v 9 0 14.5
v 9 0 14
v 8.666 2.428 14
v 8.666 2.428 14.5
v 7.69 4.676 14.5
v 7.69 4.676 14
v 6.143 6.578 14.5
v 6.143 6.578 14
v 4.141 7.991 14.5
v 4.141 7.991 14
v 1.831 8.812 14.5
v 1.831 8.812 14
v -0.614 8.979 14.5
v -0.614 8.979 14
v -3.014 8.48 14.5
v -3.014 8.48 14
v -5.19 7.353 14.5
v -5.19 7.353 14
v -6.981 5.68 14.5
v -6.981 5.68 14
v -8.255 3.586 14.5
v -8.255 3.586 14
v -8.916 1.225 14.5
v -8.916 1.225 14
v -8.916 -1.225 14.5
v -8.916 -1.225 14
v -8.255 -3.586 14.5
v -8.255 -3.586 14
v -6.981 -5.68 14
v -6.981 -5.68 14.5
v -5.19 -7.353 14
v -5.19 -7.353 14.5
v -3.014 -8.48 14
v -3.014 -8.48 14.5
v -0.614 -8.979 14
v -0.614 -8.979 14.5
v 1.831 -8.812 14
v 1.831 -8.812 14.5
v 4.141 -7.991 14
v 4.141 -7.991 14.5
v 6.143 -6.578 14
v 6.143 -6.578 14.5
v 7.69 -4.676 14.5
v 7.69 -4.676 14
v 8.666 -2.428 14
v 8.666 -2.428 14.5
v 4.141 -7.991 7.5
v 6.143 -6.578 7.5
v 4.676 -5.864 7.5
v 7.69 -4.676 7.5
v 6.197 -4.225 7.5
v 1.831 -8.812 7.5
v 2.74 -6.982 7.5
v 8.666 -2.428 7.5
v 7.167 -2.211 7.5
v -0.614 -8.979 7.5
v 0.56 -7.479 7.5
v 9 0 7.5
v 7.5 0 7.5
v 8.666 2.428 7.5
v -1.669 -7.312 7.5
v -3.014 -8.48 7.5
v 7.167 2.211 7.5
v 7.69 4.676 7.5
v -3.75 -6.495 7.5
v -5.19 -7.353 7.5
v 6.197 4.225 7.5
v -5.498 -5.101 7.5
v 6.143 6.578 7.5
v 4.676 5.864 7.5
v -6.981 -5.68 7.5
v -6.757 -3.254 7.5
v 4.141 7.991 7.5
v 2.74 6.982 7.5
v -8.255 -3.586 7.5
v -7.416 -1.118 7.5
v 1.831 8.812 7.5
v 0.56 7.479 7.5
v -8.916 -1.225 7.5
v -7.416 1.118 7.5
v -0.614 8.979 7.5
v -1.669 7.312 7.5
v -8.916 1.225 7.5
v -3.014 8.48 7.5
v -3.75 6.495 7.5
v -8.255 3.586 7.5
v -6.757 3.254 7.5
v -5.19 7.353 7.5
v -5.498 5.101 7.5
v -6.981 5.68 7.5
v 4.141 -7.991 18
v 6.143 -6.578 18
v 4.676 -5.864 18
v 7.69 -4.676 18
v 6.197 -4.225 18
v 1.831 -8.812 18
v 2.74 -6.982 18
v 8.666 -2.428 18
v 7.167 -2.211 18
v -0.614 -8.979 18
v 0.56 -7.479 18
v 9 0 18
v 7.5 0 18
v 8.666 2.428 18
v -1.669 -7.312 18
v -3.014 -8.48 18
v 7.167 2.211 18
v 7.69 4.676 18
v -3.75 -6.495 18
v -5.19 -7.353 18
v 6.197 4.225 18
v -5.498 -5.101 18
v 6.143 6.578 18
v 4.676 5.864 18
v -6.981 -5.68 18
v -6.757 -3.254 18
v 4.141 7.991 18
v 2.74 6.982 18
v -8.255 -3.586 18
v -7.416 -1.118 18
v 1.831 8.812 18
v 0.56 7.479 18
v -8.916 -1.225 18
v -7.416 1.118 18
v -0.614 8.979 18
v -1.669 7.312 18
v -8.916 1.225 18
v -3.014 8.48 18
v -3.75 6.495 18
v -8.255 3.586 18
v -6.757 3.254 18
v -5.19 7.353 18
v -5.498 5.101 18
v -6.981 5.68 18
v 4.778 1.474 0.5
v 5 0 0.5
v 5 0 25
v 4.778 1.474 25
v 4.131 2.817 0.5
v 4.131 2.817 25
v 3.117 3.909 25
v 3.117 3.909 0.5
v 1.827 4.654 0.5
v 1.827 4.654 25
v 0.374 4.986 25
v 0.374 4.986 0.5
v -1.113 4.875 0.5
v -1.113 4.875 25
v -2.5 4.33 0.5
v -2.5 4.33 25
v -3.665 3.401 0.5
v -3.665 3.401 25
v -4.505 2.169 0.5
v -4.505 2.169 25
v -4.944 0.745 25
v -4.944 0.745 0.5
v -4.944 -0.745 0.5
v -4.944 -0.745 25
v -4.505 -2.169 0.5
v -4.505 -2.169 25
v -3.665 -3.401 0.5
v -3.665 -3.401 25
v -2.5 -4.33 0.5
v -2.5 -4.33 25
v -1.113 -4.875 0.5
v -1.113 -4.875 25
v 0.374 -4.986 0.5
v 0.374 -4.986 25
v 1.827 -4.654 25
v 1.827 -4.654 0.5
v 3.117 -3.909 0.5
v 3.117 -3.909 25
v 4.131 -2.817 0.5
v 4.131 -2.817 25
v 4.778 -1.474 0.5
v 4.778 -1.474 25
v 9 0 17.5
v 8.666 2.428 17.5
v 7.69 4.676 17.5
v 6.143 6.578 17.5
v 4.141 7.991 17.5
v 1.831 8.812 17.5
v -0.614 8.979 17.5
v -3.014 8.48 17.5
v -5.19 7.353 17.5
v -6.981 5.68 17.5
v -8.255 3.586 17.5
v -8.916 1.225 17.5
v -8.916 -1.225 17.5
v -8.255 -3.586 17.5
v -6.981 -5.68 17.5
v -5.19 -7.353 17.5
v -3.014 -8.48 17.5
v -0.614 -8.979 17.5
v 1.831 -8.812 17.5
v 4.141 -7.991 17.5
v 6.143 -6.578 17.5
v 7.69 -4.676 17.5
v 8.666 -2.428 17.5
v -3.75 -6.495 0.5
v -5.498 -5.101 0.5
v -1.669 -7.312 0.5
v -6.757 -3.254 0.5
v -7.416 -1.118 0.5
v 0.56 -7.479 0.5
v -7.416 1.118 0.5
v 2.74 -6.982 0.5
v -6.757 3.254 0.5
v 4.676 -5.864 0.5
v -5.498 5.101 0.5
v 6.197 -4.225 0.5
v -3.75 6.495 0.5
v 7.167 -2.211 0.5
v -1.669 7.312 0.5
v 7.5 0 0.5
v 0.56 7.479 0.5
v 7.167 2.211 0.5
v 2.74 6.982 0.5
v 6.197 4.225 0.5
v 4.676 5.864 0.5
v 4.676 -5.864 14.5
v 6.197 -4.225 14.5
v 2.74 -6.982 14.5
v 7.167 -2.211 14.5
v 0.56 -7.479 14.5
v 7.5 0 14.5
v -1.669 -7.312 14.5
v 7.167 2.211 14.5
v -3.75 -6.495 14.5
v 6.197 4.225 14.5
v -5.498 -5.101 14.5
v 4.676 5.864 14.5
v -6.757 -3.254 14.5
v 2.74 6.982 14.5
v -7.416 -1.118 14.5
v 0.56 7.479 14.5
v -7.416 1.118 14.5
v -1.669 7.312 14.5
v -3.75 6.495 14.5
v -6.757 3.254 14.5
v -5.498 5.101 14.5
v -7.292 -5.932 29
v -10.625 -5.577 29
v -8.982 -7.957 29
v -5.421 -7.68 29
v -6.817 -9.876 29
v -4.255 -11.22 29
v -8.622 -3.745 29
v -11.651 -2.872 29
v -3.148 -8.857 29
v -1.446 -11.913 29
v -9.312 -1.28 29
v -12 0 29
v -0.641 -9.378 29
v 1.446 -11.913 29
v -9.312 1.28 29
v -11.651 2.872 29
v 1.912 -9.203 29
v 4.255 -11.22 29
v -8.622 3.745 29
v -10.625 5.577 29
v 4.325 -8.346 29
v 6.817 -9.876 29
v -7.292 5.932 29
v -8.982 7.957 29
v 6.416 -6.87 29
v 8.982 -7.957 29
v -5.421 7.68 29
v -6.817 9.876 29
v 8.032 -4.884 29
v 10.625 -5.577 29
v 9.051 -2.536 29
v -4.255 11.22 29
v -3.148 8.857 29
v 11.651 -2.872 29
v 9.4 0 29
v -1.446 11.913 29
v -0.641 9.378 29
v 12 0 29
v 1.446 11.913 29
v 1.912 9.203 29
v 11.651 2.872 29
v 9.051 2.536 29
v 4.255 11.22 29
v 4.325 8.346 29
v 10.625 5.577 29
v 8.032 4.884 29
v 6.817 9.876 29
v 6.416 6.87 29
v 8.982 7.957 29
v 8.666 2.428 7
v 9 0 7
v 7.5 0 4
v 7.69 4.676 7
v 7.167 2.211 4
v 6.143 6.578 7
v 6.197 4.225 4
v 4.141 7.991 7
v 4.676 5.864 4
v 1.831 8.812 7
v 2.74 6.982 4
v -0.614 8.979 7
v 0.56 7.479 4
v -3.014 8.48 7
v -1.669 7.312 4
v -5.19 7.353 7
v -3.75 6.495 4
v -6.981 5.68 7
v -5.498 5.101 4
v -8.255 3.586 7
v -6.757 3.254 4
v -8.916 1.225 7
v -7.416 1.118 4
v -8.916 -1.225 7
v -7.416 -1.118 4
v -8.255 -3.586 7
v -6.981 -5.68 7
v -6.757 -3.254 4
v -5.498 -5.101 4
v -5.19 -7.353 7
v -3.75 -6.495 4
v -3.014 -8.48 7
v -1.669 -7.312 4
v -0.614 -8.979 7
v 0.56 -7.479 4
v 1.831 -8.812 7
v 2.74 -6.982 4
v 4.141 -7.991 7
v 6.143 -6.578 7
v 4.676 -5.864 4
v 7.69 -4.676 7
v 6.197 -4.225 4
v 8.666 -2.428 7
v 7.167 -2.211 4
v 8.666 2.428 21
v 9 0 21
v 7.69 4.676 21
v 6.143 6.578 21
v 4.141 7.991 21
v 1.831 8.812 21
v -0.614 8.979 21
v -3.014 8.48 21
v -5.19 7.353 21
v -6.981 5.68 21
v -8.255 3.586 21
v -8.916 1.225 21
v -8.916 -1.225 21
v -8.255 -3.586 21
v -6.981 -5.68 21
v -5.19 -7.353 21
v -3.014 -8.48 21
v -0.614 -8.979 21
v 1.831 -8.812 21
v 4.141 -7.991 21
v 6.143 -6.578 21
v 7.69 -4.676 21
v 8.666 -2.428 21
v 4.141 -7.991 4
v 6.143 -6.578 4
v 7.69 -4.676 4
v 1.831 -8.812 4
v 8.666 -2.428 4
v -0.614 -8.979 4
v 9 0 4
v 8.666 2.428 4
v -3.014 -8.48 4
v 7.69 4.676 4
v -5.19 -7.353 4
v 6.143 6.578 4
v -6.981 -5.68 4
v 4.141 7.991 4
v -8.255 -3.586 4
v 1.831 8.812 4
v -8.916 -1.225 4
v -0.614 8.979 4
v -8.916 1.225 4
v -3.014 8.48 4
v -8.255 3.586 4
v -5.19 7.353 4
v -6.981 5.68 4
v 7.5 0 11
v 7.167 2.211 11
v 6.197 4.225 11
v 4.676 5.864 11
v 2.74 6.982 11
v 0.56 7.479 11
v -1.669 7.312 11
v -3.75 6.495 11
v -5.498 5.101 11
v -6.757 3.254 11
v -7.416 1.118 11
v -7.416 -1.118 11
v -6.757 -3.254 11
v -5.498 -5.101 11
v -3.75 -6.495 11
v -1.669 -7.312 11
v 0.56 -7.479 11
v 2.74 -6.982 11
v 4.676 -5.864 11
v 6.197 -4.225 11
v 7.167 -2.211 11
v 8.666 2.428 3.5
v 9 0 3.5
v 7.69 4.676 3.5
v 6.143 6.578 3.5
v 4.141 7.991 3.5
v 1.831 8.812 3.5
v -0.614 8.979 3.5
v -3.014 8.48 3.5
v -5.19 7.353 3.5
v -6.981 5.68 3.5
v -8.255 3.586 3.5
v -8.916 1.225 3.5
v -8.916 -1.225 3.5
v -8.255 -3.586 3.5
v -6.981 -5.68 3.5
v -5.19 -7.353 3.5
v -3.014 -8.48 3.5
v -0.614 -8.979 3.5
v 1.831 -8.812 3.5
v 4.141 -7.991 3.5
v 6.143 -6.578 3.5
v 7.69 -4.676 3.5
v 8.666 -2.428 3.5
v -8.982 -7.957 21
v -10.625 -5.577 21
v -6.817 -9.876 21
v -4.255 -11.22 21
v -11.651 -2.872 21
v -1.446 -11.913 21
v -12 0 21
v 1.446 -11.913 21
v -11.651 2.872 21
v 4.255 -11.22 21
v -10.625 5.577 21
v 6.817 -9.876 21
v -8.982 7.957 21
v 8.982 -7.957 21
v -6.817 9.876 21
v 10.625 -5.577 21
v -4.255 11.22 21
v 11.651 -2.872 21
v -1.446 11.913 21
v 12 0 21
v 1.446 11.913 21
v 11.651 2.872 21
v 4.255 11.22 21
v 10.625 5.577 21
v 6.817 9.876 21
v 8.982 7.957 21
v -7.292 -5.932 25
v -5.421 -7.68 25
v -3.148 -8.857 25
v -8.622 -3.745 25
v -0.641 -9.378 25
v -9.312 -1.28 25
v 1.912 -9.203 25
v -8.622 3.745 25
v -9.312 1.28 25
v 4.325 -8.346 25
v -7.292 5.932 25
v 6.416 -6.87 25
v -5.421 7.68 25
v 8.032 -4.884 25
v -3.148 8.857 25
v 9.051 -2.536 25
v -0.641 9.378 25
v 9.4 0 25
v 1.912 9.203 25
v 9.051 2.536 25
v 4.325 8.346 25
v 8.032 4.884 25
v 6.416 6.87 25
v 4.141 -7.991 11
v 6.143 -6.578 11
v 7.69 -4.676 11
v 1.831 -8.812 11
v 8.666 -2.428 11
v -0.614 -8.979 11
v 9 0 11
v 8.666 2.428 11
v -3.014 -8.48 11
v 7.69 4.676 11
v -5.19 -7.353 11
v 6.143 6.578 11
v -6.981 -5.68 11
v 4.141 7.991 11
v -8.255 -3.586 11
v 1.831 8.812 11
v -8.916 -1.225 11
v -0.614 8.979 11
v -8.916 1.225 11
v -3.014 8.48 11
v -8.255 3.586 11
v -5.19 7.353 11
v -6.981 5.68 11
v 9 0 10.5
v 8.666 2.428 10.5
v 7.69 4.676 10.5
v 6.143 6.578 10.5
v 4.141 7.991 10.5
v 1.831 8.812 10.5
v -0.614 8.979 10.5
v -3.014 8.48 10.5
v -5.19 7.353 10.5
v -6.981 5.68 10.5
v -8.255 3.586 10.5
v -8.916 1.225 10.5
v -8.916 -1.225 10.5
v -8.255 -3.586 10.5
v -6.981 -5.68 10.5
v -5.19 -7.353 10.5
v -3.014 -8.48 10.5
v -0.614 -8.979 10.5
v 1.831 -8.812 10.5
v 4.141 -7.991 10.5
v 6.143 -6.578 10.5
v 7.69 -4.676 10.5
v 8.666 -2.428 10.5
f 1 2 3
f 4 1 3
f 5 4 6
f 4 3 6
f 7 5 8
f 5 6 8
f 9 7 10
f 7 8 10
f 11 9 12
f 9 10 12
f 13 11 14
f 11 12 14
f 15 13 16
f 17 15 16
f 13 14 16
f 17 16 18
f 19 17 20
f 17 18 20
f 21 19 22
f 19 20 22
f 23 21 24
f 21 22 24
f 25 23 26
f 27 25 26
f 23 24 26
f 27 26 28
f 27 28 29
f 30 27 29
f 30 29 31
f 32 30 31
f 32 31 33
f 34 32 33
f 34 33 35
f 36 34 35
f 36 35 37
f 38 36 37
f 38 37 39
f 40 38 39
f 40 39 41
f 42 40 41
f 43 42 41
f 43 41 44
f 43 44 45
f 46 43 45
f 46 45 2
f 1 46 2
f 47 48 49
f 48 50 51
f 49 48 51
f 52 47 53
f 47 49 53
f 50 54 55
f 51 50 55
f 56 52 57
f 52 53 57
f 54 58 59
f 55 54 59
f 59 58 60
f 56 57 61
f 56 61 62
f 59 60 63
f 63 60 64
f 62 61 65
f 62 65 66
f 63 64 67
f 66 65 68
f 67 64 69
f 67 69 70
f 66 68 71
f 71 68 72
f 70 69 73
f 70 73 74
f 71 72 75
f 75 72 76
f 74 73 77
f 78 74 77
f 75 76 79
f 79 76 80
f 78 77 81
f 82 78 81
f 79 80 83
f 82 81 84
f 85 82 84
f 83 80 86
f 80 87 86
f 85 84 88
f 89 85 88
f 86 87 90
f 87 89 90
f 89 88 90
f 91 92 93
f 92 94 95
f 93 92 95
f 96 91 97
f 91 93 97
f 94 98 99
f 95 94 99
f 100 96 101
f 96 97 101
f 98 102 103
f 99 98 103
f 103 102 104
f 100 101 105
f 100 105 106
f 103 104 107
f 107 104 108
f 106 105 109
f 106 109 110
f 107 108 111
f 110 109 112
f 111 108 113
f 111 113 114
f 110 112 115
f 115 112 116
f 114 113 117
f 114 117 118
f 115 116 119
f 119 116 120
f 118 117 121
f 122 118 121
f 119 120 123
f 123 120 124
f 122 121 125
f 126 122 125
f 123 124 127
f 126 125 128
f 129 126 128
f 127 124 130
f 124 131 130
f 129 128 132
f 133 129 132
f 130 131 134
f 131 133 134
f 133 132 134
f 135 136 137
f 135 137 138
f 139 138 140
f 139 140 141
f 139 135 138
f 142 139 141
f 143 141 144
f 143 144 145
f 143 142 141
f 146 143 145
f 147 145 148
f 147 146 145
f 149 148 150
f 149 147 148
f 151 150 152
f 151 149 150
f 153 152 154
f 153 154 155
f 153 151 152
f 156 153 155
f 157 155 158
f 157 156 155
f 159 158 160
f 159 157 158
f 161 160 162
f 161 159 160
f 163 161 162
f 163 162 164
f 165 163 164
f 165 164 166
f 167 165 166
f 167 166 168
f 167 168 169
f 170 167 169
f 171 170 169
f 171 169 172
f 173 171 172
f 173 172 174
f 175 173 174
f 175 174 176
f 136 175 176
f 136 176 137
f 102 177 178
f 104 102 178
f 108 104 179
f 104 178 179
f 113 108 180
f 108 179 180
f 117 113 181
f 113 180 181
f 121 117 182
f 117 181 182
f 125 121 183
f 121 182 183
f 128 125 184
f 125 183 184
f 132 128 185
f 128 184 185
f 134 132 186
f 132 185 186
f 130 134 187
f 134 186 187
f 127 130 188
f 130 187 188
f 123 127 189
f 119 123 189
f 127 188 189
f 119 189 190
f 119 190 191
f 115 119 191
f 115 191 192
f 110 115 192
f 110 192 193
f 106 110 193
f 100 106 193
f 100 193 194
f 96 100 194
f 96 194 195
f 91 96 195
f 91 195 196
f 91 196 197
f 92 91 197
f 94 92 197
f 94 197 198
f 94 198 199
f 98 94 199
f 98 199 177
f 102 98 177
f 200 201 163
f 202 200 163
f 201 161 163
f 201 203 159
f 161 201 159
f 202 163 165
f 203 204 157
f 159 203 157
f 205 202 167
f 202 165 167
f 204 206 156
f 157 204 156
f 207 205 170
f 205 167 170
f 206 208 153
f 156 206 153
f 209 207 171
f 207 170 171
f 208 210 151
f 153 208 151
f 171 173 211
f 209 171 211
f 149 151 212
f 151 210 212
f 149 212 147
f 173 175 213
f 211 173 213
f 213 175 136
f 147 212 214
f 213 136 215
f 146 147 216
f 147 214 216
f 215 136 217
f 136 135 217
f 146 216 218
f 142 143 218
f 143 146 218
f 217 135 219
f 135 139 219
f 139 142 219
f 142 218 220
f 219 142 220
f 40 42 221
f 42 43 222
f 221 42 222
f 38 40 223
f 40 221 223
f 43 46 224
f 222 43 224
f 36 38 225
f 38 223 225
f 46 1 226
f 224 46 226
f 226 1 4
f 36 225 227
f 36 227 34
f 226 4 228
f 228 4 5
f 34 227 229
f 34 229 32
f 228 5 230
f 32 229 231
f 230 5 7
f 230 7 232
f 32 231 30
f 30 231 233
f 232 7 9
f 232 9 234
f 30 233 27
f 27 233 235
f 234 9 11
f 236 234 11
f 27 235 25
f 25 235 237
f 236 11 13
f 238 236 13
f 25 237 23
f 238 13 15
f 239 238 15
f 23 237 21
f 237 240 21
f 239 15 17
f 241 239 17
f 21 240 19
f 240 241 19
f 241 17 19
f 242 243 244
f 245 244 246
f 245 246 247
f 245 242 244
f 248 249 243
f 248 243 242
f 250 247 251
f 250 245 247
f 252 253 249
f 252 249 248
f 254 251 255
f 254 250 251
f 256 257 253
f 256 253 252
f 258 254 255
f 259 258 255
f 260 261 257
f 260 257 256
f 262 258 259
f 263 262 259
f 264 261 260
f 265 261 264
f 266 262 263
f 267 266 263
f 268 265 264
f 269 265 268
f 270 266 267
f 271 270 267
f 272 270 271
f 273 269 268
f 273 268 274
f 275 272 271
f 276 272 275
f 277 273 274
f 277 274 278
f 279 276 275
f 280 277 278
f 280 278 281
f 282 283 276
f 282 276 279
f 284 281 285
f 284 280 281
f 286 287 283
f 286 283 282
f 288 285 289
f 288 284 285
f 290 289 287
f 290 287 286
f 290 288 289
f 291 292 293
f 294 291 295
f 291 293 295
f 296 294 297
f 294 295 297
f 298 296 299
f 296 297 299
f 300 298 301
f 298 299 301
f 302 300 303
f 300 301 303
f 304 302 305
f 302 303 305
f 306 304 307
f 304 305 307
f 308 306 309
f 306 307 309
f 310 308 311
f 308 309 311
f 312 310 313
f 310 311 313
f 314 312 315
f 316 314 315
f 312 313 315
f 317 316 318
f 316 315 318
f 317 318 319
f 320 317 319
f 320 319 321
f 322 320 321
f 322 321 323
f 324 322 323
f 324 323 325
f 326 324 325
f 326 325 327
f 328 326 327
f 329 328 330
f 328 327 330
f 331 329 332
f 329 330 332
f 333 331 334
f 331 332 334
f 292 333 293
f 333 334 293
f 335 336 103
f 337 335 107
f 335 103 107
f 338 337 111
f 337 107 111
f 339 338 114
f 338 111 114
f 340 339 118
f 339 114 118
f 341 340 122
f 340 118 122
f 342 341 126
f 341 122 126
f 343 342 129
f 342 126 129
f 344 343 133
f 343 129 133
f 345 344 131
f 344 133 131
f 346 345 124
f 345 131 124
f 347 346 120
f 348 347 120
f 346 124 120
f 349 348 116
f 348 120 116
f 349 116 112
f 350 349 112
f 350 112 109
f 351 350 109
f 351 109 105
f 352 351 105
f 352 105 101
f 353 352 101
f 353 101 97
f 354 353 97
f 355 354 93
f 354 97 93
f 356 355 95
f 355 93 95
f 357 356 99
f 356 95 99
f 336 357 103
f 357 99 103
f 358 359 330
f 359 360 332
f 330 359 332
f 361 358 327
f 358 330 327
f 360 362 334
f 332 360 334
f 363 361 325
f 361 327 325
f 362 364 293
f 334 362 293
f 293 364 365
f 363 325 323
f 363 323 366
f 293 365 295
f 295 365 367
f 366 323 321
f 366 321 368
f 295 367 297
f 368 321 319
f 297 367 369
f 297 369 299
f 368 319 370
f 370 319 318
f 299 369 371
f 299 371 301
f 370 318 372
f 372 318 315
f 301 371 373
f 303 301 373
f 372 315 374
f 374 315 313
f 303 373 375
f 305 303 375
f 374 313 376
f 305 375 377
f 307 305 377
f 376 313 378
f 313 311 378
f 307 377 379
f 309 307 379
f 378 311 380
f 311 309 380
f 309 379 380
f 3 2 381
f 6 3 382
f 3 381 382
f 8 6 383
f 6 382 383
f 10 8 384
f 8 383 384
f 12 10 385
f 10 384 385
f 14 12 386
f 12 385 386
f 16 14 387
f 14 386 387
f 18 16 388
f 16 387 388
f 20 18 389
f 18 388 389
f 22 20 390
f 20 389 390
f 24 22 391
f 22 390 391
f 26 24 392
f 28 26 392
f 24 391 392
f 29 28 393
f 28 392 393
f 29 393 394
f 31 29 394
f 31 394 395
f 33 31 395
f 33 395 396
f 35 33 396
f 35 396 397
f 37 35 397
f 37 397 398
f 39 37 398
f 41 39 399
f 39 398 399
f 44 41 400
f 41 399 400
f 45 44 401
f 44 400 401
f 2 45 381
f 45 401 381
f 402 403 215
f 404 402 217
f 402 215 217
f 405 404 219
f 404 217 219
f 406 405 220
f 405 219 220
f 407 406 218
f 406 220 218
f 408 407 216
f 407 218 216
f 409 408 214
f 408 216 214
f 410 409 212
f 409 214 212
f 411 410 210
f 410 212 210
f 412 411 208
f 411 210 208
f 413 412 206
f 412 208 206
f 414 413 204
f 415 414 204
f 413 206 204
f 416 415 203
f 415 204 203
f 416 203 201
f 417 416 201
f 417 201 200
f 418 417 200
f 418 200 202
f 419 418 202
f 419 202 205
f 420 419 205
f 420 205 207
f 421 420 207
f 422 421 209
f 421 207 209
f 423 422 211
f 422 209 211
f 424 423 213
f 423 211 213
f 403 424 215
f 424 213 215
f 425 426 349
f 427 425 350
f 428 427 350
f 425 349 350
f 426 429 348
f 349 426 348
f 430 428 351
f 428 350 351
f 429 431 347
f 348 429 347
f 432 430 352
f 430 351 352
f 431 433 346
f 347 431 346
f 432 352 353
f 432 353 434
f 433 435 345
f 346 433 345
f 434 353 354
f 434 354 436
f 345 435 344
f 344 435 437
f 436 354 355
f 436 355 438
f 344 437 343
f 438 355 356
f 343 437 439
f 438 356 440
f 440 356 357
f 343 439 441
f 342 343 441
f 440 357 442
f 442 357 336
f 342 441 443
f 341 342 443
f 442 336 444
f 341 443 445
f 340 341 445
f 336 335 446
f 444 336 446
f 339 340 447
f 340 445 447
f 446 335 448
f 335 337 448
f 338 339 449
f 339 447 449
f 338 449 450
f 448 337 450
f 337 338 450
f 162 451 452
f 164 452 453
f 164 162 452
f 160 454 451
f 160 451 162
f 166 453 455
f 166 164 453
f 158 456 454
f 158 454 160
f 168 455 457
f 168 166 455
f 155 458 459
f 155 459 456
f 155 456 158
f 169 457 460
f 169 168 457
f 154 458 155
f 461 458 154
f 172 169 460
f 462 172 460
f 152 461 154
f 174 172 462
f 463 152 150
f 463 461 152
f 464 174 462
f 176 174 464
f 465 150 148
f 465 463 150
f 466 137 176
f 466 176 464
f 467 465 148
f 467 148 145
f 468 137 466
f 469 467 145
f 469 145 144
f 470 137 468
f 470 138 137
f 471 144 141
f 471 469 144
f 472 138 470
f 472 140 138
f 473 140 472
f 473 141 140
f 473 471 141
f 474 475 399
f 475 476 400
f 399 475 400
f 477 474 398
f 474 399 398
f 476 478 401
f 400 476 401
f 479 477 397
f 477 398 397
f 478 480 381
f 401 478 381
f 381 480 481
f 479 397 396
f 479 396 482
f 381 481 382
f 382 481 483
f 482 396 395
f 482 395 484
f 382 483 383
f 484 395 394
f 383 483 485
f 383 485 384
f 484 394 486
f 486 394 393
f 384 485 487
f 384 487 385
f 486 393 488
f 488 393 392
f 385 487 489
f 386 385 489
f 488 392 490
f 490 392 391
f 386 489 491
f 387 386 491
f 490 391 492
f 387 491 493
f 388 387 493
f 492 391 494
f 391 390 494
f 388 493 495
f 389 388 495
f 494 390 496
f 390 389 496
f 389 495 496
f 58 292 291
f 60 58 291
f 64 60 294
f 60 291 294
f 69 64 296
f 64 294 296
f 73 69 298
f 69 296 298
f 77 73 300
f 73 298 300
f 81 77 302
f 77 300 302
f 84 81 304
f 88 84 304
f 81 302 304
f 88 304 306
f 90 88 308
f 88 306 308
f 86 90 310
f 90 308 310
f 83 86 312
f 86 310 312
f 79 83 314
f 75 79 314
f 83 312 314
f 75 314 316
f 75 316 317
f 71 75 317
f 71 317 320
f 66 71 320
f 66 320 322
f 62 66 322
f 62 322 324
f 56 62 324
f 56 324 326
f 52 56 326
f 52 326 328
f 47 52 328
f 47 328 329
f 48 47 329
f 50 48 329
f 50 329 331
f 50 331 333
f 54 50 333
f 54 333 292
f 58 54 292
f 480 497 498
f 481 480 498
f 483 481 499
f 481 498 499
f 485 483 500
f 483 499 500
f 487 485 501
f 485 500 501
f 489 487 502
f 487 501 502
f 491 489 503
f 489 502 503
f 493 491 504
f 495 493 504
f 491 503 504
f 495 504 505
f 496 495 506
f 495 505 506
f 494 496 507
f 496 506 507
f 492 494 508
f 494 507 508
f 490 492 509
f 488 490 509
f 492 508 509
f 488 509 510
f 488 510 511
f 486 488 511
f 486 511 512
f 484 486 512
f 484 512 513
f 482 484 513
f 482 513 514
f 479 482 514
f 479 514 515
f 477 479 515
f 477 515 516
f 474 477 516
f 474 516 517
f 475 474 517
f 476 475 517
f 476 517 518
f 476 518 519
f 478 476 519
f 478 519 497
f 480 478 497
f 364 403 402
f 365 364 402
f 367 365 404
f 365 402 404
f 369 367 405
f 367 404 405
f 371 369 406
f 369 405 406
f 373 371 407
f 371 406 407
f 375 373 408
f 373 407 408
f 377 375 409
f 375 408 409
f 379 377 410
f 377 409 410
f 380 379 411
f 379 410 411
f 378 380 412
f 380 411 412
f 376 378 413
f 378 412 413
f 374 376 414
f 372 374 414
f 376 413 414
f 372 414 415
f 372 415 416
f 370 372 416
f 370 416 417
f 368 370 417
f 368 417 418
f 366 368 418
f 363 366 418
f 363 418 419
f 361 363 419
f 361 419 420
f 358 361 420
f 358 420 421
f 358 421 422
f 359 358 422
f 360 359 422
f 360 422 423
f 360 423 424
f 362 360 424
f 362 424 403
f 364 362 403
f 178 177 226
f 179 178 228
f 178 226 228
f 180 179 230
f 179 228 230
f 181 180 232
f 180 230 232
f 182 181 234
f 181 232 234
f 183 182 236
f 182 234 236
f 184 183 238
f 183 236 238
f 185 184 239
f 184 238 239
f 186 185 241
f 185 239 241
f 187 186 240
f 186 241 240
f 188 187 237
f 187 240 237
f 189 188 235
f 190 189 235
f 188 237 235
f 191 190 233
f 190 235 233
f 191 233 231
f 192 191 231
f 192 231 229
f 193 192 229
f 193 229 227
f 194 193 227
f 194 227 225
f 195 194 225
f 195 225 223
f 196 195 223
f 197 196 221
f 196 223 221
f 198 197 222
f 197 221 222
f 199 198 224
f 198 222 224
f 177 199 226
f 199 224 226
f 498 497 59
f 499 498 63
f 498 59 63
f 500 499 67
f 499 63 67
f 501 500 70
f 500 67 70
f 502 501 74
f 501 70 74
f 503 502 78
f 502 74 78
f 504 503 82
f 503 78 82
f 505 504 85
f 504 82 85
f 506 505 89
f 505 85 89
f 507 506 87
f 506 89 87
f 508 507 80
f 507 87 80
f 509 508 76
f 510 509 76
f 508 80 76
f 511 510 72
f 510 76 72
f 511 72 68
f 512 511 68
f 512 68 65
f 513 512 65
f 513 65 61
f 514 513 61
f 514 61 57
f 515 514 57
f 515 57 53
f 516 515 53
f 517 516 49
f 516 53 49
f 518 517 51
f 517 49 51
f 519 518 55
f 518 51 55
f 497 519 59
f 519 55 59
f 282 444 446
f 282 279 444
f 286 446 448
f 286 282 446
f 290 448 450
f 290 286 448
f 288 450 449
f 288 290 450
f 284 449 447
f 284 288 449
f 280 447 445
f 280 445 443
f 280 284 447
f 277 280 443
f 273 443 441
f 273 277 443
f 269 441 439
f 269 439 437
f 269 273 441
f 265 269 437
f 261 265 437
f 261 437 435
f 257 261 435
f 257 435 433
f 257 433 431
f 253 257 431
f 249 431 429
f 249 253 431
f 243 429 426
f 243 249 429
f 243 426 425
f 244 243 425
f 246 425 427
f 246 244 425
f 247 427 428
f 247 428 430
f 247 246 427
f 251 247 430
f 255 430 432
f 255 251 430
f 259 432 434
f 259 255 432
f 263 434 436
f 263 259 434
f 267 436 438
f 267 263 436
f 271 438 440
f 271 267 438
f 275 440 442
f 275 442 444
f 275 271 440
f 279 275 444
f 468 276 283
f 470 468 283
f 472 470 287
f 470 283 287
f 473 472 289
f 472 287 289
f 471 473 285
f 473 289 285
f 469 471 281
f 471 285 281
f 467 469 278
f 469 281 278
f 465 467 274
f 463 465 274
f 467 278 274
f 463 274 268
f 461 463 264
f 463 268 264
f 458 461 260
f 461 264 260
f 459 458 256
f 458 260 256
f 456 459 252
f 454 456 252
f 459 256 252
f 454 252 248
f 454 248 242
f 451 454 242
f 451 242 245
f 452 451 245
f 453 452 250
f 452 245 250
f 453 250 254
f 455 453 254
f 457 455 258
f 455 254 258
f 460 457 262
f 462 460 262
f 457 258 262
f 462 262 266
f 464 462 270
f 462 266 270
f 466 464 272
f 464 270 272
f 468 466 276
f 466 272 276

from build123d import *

# Parameters (mm, degrees)
F0_R      = 9
F0_R_2    = 5
F1_DEPTH  = 25
F17_DEPTH = 0.5
F18_R     = 12
F18_R_2   = 9
F19_DEPTH = 4
F20_R     = 9.4
F20_R_2   = 9
F21_DEPTH = 4


with BuildPart() as f1:
    # F0 (on Top) → F1 (new body)
    with BuildSketch(Plane.XY):
        Circle(F0_R)
        Circle(F0_R_2, mode=Mode.SUBTRACT)
    extrude(amount=F1_DEPTH)

    # F15 (on Front) → F16 (revolve, cut)
    with BuildSketch(Plane.XZ):
        Polygon((9, 18), (9, 21), (7.5, 18), align=None)
        Polygon((7.5, 14.5), (9, 14.5), (9, 17.5), align=None)
        Polygon((7.5, 11), (9, 11), (9, 14), align=None)
        Polygon((7.5, 7.5), (9, 7.5), (9, 10.5), align=None)
        Polygon((7.5, 4), (9, 4), (9, 7), align=None)
        Polygon((7.5, 0.5), (9, 0.5), (9, 3.5), align=None)
    revolve(axis=Axis((0, 0, 25), (0, 0, 1)), mode=Mode.SUBTRACT)

    # F17 (cut): a face of the model
    f17_faces = [f1.faces().sort_by_distance(p)[0] for p in [
        (-8.7454415588, 0, 0),
    ]]
    extrude(f17_faces, amount=-F17_DEPTH, mode=Mode.SUBTRACT)

    # F18 (on face) → F19 (join, symmetric)
    with BuildSketch(Plane.XY.offset(25)):
        Circle(F18_R)
        Circle(F18_R_2, mode=Mode.SUBTRACT)
    extrude(amount=F19_DEPTH, both=True)

    # F20 (on face) → F21 (cut, through all)
    with BuildSketch(Plane.XY.offset(29)):
        Circle(F20_R)
        Circle(F20_R_2, mode=Mode.SUBTRACT)
    extrude(amount=-F21_DEPTH, mode=Mode.SUBTRACT)


solid = f1.part
